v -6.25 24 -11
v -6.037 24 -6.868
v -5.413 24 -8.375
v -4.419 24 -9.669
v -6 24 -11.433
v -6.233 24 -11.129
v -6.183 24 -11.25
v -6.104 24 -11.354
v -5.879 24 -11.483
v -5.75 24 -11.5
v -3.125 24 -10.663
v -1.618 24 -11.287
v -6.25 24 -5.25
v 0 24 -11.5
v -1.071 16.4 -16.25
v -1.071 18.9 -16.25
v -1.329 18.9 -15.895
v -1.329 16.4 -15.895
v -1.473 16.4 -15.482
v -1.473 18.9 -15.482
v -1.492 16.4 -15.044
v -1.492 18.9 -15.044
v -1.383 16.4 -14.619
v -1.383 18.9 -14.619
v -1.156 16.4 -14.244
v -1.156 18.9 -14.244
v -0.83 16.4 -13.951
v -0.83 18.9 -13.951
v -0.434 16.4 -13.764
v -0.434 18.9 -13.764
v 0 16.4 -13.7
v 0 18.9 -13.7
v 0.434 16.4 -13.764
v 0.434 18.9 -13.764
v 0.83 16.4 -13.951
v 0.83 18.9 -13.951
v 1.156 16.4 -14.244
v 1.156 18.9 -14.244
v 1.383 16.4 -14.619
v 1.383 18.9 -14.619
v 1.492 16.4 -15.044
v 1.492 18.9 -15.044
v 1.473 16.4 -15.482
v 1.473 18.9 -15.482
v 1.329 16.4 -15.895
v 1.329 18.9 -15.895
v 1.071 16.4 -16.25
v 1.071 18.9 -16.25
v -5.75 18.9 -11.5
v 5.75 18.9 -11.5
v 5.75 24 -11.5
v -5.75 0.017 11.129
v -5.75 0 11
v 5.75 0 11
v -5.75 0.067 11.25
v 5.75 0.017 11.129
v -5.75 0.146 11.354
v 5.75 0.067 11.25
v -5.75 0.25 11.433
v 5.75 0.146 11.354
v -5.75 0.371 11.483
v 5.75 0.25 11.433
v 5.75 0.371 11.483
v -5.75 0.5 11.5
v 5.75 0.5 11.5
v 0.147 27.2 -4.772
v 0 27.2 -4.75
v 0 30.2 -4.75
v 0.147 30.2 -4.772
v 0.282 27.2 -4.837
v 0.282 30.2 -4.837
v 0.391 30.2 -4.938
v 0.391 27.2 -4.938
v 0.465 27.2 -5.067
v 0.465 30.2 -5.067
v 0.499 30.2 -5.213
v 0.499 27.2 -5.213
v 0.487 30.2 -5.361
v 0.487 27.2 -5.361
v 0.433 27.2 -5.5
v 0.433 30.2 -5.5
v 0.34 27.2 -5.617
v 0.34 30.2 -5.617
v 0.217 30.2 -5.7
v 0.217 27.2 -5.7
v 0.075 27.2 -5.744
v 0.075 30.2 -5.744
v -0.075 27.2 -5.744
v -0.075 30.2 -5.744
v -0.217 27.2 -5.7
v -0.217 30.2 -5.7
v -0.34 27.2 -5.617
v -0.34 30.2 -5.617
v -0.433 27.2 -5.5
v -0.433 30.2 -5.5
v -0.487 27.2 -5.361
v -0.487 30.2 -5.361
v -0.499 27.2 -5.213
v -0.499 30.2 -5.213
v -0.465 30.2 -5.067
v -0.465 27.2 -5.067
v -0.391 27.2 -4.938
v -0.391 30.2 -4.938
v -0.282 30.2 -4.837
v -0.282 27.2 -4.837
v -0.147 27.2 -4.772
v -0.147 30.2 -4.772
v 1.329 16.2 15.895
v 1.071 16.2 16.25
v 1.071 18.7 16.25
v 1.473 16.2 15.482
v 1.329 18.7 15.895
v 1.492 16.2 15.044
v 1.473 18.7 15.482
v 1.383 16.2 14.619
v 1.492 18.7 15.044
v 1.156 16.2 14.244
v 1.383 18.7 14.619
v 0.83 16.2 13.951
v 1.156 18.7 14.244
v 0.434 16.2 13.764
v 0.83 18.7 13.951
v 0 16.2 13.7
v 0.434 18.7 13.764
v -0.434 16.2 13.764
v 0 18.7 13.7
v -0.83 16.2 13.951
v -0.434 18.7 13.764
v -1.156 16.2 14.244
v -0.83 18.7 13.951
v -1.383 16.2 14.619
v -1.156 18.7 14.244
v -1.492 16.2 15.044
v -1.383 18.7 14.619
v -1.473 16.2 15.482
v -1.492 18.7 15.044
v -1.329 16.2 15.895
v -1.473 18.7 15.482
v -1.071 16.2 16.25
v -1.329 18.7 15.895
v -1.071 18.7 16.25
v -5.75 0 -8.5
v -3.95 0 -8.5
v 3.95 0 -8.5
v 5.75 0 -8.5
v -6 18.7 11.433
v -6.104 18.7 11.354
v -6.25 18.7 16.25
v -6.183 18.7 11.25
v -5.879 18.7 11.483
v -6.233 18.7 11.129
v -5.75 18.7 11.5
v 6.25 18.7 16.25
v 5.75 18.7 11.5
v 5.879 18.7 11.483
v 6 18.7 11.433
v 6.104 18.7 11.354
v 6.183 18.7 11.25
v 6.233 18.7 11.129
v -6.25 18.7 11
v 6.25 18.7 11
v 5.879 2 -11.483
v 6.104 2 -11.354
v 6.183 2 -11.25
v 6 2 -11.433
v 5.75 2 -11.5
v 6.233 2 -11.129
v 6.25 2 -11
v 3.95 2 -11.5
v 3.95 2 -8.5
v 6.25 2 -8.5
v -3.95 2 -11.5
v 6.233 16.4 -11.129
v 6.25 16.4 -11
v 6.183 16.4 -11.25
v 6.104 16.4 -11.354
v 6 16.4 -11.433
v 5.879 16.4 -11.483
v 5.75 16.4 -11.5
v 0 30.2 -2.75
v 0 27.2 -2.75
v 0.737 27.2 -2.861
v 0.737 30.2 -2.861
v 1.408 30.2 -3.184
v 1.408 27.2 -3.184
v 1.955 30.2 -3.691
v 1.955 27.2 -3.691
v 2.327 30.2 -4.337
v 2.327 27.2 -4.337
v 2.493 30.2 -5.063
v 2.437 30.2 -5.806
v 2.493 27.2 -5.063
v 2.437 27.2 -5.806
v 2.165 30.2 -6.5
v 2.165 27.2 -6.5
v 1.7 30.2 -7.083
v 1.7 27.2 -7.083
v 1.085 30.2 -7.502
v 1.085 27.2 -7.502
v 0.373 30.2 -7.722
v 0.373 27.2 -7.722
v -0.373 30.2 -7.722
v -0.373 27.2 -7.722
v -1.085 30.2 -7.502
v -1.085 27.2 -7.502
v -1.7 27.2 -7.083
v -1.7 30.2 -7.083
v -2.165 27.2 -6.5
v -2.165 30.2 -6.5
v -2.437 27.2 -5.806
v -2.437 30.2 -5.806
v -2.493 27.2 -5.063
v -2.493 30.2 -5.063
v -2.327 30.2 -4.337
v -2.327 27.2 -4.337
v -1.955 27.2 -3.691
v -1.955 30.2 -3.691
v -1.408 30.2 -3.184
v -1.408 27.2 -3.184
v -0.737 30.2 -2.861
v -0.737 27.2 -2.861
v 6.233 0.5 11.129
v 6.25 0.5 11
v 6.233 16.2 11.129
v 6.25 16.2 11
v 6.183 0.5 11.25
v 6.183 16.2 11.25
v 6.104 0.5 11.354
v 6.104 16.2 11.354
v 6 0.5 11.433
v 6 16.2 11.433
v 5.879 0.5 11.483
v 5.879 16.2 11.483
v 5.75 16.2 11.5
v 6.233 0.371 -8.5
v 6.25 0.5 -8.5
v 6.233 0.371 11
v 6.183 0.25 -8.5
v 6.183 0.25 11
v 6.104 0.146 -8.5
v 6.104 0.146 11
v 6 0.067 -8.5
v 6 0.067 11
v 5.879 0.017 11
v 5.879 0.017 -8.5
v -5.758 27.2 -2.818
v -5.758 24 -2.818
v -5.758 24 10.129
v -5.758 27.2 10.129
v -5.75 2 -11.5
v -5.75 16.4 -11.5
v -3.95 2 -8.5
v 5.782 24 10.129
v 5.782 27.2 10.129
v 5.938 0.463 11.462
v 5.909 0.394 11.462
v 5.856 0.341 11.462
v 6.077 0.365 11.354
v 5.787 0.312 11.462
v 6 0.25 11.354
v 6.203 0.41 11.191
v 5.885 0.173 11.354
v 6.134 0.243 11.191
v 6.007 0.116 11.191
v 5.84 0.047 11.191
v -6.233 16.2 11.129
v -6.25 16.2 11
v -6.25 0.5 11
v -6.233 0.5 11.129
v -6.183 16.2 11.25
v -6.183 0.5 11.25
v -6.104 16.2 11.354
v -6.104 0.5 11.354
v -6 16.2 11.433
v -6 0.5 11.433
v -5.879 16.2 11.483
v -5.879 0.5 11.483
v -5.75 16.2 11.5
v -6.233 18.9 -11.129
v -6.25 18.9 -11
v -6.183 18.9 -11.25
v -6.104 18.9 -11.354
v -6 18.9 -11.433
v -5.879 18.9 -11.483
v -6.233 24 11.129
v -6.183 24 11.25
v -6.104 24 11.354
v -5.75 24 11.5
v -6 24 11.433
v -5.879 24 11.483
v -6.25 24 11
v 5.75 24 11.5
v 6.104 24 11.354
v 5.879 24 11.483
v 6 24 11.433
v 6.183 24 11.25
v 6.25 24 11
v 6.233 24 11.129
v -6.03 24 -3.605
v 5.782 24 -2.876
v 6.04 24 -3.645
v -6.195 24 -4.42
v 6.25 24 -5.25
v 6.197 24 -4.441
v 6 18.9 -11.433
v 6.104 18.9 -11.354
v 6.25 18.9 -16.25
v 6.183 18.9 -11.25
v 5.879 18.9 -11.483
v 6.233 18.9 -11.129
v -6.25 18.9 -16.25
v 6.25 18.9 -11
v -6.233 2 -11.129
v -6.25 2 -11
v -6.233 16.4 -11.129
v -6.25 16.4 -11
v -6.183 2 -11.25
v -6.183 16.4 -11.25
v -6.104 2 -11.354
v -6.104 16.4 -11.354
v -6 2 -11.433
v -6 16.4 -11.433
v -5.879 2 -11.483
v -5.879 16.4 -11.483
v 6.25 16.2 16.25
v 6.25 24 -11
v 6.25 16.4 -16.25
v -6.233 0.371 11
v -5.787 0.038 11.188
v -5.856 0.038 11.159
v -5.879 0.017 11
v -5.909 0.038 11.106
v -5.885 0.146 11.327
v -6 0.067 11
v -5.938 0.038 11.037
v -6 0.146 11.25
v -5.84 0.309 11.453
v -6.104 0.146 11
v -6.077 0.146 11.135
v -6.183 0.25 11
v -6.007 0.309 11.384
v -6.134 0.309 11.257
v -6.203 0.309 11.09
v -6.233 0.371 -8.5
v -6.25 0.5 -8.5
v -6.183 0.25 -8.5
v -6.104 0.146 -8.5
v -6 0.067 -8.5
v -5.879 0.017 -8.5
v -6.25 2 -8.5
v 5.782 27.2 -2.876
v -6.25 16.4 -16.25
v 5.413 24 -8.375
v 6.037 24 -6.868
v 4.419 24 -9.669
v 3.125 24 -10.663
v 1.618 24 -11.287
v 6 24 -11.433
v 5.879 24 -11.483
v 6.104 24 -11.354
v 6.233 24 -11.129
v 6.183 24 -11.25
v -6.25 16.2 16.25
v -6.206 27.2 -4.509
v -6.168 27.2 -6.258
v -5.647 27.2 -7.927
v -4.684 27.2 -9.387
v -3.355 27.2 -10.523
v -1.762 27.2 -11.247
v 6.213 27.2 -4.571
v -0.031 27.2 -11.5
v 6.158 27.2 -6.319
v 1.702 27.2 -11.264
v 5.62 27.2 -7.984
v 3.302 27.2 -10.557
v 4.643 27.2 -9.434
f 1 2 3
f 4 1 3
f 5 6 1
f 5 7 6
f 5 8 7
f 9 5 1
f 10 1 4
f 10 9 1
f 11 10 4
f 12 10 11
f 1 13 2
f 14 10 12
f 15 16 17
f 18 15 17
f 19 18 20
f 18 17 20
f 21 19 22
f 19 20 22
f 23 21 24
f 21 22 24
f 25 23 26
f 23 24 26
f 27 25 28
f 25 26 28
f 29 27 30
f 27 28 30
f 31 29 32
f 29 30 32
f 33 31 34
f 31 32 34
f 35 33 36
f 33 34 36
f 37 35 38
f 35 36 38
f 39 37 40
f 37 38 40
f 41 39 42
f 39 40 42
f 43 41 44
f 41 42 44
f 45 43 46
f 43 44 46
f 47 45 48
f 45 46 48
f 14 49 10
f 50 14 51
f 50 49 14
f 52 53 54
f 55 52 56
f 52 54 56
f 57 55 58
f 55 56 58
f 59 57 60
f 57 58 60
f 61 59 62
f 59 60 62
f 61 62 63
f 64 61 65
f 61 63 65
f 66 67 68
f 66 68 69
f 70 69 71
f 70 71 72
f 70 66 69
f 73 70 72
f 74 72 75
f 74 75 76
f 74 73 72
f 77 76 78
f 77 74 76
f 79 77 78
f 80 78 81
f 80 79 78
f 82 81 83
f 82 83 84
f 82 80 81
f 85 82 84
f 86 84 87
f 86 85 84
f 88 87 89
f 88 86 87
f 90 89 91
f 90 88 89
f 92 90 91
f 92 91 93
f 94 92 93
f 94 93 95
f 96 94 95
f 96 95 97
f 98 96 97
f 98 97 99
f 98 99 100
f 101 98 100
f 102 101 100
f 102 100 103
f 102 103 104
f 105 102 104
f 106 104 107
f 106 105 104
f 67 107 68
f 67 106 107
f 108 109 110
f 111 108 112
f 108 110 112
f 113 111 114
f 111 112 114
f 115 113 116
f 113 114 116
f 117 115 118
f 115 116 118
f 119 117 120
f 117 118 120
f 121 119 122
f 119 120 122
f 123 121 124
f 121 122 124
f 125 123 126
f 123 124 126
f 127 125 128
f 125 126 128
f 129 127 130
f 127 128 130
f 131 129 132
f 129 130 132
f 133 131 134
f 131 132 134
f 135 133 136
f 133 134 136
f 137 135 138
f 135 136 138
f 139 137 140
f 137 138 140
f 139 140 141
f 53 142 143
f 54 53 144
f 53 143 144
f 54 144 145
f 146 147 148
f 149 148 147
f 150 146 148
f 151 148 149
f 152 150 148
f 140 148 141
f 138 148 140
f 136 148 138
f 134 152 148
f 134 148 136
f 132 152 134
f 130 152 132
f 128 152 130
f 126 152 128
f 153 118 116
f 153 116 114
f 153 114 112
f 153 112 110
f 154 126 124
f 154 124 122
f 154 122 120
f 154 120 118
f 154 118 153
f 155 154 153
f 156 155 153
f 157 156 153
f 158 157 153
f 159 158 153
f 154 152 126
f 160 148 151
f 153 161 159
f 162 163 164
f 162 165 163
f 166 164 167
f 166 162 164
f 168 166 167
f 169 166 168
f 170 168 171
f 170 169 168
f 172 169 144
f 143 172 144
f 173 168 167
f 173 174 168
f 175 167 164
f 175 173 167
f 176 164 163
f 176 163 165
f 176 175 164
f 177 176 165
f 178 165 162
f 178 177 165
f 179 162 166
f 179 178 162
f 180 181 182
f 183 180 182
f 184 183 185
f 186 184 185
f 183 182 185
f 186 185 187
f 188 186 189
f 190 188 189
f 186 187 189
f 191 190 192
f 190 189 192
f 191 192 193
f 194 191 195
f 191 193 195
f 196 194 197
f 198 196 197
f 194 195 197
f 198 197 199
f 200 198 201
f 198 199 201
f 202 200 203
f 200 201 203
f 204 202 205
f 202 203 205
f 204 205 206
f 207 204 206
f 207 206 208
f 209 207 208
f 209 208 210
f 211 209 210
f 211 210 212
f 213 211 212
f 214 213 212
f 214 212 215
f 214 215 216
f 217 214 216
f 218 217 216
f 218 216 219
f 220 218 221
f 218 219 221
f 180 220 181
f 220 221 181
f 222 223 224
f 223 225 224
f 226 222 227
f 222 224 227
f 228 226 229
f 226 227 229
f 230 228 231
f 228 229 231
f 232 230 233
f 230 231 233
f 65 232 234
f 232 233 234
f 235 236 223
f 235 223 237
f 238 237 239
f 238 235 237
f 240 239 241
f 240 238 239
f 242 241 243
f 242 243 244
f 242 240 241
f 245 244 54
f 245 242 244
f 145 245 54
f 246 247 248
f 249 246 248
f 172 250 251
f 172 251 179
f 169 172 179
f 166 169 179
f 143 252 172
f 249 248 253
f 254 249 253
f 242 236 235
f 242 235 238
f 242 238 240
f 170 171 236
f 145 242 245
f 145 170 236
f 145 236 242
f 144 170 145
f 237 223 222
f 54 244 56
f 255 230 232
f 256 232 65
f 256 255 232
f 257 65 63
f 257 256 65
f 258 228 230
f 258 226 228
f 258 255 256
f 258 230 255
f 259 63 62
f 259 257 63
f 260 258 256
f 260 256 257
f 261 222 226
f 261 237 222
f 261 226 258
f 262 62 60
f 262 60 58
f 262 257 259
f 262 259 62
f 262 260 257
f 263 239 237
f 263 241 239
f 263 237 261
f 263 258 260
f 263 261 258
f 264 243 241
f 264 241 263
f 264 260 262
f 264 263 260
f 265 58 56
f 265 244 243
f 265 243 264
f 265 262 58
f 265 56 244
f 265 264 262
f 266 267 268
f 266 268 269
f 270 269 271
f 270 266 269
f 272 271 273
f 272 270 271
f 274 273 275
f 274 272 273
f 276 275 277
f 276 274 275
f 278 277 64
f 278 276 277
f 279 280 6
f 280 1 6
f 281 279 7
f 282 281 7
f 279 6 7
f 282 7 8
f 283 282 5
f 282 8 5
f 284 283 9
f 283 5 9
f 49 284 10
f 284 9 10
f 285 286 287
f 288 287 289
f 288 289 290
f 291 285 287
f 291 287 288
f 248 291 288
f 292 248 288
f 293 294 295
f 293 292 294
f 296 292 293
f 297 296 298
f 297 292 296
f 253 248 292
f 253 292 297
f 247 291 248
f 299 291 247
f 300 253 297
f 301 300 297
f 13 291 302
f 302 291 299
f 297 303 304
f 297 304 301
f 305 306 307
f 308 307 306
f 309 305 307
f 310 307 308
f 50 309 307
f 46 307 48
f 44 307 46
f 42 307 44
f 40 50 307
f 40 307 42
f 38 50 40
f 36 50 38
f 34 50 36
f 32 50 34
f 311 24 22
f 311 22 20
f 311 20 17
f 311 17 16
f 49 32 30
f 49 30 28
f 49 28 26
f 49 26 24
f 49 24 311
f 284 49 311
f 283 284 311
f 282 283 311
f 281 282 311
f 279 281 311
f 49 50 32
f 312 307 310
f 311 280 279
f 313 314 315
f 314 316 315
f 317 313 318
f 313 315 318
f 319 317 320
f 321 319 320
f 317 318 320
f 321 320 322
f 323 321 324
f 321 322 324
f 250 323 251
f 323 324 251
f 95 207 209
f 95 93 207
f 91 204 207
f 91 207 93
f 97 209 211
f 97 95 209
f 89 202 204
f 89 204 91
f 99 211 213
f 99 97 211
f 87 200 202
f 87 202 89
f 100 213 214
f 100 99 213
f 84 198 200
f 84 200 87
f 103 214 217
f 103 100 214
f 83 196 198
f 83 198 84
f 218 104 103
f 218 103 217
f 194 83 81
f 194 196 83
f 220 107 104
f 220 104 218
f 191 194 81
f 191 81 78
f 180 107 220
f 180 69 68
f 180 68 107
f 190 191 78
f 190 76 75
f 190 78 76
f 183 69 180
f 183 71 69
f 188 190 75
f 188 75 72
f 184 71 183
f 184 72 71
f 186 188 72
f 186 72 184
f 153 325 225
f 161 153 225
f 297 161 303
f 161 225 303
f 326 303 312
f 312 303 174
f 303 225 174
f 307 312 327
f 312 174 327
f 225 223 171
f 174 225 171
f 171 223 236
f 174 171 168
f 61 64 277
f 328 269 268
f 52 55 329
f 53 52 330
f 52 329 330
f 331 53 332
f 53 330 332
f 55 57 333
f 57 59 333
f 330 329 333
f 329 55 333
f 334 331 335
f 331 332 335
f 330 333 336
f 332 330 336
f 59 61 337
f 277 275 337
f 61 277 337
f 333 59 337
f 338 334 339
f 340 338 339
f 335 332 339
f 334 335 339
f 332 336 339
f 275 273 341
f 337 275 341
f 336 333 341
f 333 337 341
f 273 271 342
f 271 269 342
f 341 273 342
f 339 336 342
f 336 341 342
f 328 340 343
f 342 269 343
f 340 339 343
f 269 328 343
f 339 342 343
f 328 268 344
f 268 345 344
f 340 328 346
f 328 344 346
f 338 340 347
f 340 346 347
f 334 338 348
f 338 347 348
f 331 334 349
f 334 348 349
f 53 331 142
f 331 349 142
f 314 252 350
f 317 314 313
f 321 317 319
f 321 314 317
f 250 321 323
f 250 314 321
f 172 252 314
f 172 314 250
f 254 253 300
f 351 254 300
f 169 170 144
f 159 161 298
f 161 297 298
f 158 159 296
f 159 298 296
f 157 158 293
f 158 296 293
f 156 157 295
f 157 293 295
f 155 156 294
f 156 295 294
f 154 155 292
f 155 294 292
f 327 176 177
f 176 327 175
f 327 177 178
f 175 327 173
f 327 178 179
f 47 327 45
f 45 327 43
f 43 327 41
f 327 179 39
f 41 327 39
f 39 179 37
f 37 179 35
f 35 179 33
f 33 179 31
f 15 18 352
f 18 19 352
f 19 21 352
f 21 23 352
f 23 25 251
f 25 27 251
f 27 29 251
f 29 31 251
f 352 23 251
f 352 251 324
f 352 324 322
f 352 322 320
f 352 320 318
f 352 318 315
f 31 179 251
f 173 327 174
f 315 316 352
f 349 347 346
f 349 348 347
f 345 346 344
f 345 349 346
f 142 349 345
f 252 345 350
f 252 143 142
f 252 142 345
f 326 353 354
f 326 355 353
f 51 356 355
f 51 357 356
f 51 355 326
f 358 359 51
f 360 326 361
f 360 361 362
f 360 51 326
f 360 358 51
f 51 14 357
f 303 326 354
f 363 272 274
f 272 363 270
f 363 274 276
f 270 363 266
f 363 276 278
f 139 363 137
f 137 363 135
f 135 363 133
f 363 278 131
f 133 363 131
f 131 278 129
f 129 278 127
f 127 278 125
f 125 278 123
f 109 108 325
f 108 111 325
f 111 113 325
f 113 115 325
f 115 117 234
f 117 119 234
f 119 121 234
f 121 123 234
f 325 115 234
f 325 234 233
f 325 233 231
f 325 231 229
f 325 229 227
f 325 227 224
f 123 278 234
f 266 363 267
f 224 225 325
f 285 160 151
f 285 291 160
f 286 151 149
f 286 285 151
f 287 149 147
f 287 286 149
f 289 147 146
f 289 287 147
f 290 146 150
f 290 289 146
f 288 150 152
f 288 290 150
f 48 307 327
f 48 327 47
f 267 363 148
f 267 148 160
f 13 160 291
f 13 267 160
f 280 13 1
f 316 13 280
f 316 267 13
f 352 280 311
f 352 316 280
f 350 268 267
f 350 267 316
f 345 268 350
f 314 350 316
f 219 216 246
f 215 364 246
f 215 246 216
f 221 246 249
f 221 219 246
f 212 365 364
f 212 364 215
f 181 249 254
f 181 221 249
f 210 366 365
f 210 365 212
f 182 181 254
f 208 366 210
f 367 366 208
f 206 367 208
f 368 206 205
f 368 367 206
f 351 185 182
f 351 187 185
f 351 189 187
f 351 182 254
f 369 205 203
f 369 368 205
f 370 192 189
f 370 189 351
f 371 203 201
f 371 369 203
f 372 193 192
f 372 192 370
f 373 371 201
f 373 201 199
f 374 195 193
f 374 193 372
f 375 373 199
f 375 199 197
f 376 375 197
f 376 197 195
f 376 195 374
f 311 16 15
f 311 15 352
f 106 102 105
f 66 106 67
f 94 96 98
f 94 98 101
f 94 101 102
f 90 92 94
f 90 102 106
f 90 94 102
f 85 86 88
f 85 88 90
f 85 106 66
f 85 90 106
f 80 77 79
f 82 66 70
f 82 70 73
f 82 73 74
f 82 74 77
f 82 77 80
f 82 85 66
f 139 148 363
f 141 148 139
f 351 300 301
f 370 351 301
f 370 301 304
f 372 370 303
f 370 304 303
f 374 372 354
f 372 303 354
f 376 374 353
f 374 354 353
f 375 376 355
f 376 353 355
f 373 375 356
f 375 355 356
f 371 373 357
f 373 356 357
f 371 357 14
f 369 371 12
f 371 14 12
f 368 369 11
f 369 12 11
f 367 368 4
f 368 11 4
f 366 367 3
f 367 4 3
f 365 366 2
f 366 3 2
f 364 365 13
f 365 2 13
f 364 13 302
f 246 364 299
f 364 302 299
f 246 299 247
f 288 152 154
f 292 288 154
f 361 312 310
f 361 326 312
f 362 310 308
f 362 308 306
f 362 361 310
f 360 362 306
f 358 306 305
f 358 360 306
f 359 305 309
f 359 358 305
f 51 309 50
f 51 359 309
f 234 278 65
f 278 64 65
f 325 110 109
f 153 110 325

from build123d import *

# Parameters (mm, degrees)
SKETCH1_W               = 12.5
SKETCH1_H               = 23
BOSS_EXTRUDE1_DEPTH     = 24
BOSS_EXTRUDE2_DEPTH     = 3.2
SKETCH3_R               = 2.5
SKETCH3_R_2             = 0.5
BOSS_EXTRUDE3_DEPTH     = 3
SKETCH4_W               = 12.5
SKETCH4_H               = 2.5
BOSS_EXTRUDE4_DEPTH     = 4.75
SKETCH5_W               = 12.5
SKETCH5_H               = 2.5
BOSS_EXTRUDE5_DEPTH     = 4.75
CUT_EXTRUDE1_REACH      = 27.55
SKETCH6_R               = 1.5
CUT_EXTRUDE2_REACH      = 27.697
SKETCH8_R               = 1.5
CUT_EXTRUDE4_DEPTH      = 37.501404083
CUT_EXTRUDE6_DEPTH      = 37.501404083
CUT_EXTRUDE6_DEPTH_BACK = 2.3
CUT_EXTRUDE7_DEPTH      = 37.501404083
CUT_EXTRUDE7_DEPTH_BACK = 2.3
FILLET1_R               = 0.5


with BuildPart() as part:
    # Sketch1 → Boss-Extrude1 (new body)
    with BuildSketch(Plane(origin=(0, 0, 0), x_dir=(1, 0, 0), z_dir=(0, 1, 0))):
        Rectangle(SKETCH1_W, SKETCH1_H)
    extrude(amount=BOSS_EXTRUDE1_DEPTH)

    # Sketch2 → Boss-Extrude2 (add)
    with BuildSketch(Plane(origin=(0, 24, 0), x_dir=(1, 0, 0), z_dir=(0, 1, 0))):
        with BuildLine():
            Line((-5.757621024, 2.818477812), (-5.757621024, -10.12881992))
            Line((-5.757621024, -10.12881992), (5.781688552, -10.12881992))
            Line((5.781688552, -10.12881992), (5.781688552, 2.876273501))
            ThreePointArc((5.781688552, 2.876273501), (-0.031303305, 11.499921608), (-5.757621024, 2.818477812))
        make_face()
    extrude(amount=BOSS_EXTRUDE2_DEPTH)

    # Sketch3 → Boss-Extrude3 (add)
    with BuildSketch(Plane(origin=(0, 27.2, 0), x_dir=(1, 0, 0), z_dir=(0, 1, 0))):
        with Locations(Location((0, 5.25, 0), (0, 0, 270))):
            Circle(SKETCH3_R)
        with Locations(Location((0, 5.25, 0), (0, 0, 270))):
            Circle(SKETCH3_R_2, mode=Mode.SUBTRACT)
    extrude(amount=BOSS_EXTRUDE3_DEPTH)

    # Sketch4 → Boss-Extrude4 (add)
    with BuildSketch(Plane(origin=(0, 0, -11.5), x_dir=(-1, 0, 0), z_dir=(0, 0, -1))):
        with Locations((0, 17.65)):
            Rectangle(SKETCH4_W, SKETCH4_H)
    extrude(amount=BOSS_EXTRUDE4_DEPTH)

    # Sketch5 → Boss-Extrude5 (add)
    with BuildSketch(Plane.XY.offset(11.5)):
        with Locations((0, 17.45)):
            Rectangle(SKETCH5_W, SKETCH5_H)
    extrude(amount=BOSS_EXTRUDE5_DEPTH)

    # Sketch6 → Cut-Extrude1 (cut, up to next)
    with BuildSketch(Plane(origin=(0, 18.7, 0), x_dir=(1, 0, 0), z_dir=(0, 1, 0)), mode=Mode.PRIVATE) as cut_extrude1_sk1:
        with Locations((0, -15.2)):
            Circle(SKETCH6_R)
    cut_extrude1_tool1 = extrude(cut_extrude1_sk1.sketch, amount=-CUT_EXTRUDE1_REACH, mode=Mode.PRIVATE) & part.part
    add(cut_extrude1_tool1.solids().sort_by_distance((0, 18.7, 15.2))[0], mode=Mode.SUBTRACT)

    # Sketch8 → Cut-Extrude2 (cut, up to next)
    with BuildSketch(Plane(origin=(0, 18.9, 0), x_dir=(1, 0, 0), z_dir=(0, 1, 0)), mode=Mode.PRIVATE) as cut_extrude2_sk1:
        with Locations((0, 15.2)):
            Circle(SKETCH8_R)
    cut_extrude2_tool1 = extrude(cut_extrude2_sk1.sketch, amount=-CUT_EXTRUDE2_REACH, mode=Mode.PRIVATE) & part.part
    add(cut_extrude2_tool1.solids().sort_by_distance((0, 18.9, -15.2))[0], mode=Mode.SUBTRACT)

    # Sketch9 → Cut-Extrude4 (cut, through all)
    with BuildSketch(Plane(origin=(6.25, 0, 0), x_dir=(0, 0, -1), z_dir=(1, 0, 0))):
        Polygon((11.5, 2), (8.5, 0), (11.5, 0), align=None)
    extrude(amount=-CUT_EXTRUDE4_DEPTH, mode=Mode.SUBTRACT)

    # Sketch10 → Cut-Extrude6 (cut, two sides: drawn at the far end of the back side and taken through both)
    with BuildSketch(Plane(origin=(6.25, 0, 0), x_dir=(0, 0, -1), z_dir=(1, 0, 0)).offset(-CUT_EXTRUDE6_DEPTH_BACK)):
        Polygon((100.627808007, 2), (11.5, 2), (8.5, 2), (8.5, 0), (8.5, -89.127808007), (133.856074627, -215.859489897), (225.983882634, -124.73168189), align=None)
    extrude(amount=CUT_EXTRUDE6_DEPTH + CUT_EXTRUDE6_DEPTH_BACK, mode=Mode.SUBTRACT)

    # Sketch11 → Cut-Extrude7 (cut, two sides: drawn at the far end of the back side and taken through both)
    with BuildSketch(Plane.ZY.offset(6.25).offset(-CUT_EXTRUDE7_DEPTH_BACK)):
        Polygon((-100.627808007, 2), (-11.5, 2), (-8.5, 2), (-8.5, 0), (-8.5, -89.127808007), (-133.856074627, -215.859489897), (-225.983882634, -124.73168189), align=None)
    extrude(amount=CUT_EXTRUDE7_DEPTH + CUT_EXTRUDE7_DEPTH_BACK, mode=Mode.SUBTRACT)

    # Fillet1
    fillet1_edges = [part.edges().sort_by_distance(p)[0] for p in [
        (-6.25, 9.2, -11.5),
        (6.25, 9.2, -11.5),
        (6.25, 0, 1.5),
        (6.25, 8.1, 11.5),
        (-6.25, 8.1, 11.5),
        (0, 0, 11.5),
        (-6.25, 21.45, -11.5),
        (6.25, 21.45, -11.5),
        (6.25, 21.35, 11.5),
        (-6.25, 21.35, 11.5),
        (-6.25, 0, 1.5),
    ]]
    fillet(fillet1_edges, radius=FILLET1_R)


solid = part.part
